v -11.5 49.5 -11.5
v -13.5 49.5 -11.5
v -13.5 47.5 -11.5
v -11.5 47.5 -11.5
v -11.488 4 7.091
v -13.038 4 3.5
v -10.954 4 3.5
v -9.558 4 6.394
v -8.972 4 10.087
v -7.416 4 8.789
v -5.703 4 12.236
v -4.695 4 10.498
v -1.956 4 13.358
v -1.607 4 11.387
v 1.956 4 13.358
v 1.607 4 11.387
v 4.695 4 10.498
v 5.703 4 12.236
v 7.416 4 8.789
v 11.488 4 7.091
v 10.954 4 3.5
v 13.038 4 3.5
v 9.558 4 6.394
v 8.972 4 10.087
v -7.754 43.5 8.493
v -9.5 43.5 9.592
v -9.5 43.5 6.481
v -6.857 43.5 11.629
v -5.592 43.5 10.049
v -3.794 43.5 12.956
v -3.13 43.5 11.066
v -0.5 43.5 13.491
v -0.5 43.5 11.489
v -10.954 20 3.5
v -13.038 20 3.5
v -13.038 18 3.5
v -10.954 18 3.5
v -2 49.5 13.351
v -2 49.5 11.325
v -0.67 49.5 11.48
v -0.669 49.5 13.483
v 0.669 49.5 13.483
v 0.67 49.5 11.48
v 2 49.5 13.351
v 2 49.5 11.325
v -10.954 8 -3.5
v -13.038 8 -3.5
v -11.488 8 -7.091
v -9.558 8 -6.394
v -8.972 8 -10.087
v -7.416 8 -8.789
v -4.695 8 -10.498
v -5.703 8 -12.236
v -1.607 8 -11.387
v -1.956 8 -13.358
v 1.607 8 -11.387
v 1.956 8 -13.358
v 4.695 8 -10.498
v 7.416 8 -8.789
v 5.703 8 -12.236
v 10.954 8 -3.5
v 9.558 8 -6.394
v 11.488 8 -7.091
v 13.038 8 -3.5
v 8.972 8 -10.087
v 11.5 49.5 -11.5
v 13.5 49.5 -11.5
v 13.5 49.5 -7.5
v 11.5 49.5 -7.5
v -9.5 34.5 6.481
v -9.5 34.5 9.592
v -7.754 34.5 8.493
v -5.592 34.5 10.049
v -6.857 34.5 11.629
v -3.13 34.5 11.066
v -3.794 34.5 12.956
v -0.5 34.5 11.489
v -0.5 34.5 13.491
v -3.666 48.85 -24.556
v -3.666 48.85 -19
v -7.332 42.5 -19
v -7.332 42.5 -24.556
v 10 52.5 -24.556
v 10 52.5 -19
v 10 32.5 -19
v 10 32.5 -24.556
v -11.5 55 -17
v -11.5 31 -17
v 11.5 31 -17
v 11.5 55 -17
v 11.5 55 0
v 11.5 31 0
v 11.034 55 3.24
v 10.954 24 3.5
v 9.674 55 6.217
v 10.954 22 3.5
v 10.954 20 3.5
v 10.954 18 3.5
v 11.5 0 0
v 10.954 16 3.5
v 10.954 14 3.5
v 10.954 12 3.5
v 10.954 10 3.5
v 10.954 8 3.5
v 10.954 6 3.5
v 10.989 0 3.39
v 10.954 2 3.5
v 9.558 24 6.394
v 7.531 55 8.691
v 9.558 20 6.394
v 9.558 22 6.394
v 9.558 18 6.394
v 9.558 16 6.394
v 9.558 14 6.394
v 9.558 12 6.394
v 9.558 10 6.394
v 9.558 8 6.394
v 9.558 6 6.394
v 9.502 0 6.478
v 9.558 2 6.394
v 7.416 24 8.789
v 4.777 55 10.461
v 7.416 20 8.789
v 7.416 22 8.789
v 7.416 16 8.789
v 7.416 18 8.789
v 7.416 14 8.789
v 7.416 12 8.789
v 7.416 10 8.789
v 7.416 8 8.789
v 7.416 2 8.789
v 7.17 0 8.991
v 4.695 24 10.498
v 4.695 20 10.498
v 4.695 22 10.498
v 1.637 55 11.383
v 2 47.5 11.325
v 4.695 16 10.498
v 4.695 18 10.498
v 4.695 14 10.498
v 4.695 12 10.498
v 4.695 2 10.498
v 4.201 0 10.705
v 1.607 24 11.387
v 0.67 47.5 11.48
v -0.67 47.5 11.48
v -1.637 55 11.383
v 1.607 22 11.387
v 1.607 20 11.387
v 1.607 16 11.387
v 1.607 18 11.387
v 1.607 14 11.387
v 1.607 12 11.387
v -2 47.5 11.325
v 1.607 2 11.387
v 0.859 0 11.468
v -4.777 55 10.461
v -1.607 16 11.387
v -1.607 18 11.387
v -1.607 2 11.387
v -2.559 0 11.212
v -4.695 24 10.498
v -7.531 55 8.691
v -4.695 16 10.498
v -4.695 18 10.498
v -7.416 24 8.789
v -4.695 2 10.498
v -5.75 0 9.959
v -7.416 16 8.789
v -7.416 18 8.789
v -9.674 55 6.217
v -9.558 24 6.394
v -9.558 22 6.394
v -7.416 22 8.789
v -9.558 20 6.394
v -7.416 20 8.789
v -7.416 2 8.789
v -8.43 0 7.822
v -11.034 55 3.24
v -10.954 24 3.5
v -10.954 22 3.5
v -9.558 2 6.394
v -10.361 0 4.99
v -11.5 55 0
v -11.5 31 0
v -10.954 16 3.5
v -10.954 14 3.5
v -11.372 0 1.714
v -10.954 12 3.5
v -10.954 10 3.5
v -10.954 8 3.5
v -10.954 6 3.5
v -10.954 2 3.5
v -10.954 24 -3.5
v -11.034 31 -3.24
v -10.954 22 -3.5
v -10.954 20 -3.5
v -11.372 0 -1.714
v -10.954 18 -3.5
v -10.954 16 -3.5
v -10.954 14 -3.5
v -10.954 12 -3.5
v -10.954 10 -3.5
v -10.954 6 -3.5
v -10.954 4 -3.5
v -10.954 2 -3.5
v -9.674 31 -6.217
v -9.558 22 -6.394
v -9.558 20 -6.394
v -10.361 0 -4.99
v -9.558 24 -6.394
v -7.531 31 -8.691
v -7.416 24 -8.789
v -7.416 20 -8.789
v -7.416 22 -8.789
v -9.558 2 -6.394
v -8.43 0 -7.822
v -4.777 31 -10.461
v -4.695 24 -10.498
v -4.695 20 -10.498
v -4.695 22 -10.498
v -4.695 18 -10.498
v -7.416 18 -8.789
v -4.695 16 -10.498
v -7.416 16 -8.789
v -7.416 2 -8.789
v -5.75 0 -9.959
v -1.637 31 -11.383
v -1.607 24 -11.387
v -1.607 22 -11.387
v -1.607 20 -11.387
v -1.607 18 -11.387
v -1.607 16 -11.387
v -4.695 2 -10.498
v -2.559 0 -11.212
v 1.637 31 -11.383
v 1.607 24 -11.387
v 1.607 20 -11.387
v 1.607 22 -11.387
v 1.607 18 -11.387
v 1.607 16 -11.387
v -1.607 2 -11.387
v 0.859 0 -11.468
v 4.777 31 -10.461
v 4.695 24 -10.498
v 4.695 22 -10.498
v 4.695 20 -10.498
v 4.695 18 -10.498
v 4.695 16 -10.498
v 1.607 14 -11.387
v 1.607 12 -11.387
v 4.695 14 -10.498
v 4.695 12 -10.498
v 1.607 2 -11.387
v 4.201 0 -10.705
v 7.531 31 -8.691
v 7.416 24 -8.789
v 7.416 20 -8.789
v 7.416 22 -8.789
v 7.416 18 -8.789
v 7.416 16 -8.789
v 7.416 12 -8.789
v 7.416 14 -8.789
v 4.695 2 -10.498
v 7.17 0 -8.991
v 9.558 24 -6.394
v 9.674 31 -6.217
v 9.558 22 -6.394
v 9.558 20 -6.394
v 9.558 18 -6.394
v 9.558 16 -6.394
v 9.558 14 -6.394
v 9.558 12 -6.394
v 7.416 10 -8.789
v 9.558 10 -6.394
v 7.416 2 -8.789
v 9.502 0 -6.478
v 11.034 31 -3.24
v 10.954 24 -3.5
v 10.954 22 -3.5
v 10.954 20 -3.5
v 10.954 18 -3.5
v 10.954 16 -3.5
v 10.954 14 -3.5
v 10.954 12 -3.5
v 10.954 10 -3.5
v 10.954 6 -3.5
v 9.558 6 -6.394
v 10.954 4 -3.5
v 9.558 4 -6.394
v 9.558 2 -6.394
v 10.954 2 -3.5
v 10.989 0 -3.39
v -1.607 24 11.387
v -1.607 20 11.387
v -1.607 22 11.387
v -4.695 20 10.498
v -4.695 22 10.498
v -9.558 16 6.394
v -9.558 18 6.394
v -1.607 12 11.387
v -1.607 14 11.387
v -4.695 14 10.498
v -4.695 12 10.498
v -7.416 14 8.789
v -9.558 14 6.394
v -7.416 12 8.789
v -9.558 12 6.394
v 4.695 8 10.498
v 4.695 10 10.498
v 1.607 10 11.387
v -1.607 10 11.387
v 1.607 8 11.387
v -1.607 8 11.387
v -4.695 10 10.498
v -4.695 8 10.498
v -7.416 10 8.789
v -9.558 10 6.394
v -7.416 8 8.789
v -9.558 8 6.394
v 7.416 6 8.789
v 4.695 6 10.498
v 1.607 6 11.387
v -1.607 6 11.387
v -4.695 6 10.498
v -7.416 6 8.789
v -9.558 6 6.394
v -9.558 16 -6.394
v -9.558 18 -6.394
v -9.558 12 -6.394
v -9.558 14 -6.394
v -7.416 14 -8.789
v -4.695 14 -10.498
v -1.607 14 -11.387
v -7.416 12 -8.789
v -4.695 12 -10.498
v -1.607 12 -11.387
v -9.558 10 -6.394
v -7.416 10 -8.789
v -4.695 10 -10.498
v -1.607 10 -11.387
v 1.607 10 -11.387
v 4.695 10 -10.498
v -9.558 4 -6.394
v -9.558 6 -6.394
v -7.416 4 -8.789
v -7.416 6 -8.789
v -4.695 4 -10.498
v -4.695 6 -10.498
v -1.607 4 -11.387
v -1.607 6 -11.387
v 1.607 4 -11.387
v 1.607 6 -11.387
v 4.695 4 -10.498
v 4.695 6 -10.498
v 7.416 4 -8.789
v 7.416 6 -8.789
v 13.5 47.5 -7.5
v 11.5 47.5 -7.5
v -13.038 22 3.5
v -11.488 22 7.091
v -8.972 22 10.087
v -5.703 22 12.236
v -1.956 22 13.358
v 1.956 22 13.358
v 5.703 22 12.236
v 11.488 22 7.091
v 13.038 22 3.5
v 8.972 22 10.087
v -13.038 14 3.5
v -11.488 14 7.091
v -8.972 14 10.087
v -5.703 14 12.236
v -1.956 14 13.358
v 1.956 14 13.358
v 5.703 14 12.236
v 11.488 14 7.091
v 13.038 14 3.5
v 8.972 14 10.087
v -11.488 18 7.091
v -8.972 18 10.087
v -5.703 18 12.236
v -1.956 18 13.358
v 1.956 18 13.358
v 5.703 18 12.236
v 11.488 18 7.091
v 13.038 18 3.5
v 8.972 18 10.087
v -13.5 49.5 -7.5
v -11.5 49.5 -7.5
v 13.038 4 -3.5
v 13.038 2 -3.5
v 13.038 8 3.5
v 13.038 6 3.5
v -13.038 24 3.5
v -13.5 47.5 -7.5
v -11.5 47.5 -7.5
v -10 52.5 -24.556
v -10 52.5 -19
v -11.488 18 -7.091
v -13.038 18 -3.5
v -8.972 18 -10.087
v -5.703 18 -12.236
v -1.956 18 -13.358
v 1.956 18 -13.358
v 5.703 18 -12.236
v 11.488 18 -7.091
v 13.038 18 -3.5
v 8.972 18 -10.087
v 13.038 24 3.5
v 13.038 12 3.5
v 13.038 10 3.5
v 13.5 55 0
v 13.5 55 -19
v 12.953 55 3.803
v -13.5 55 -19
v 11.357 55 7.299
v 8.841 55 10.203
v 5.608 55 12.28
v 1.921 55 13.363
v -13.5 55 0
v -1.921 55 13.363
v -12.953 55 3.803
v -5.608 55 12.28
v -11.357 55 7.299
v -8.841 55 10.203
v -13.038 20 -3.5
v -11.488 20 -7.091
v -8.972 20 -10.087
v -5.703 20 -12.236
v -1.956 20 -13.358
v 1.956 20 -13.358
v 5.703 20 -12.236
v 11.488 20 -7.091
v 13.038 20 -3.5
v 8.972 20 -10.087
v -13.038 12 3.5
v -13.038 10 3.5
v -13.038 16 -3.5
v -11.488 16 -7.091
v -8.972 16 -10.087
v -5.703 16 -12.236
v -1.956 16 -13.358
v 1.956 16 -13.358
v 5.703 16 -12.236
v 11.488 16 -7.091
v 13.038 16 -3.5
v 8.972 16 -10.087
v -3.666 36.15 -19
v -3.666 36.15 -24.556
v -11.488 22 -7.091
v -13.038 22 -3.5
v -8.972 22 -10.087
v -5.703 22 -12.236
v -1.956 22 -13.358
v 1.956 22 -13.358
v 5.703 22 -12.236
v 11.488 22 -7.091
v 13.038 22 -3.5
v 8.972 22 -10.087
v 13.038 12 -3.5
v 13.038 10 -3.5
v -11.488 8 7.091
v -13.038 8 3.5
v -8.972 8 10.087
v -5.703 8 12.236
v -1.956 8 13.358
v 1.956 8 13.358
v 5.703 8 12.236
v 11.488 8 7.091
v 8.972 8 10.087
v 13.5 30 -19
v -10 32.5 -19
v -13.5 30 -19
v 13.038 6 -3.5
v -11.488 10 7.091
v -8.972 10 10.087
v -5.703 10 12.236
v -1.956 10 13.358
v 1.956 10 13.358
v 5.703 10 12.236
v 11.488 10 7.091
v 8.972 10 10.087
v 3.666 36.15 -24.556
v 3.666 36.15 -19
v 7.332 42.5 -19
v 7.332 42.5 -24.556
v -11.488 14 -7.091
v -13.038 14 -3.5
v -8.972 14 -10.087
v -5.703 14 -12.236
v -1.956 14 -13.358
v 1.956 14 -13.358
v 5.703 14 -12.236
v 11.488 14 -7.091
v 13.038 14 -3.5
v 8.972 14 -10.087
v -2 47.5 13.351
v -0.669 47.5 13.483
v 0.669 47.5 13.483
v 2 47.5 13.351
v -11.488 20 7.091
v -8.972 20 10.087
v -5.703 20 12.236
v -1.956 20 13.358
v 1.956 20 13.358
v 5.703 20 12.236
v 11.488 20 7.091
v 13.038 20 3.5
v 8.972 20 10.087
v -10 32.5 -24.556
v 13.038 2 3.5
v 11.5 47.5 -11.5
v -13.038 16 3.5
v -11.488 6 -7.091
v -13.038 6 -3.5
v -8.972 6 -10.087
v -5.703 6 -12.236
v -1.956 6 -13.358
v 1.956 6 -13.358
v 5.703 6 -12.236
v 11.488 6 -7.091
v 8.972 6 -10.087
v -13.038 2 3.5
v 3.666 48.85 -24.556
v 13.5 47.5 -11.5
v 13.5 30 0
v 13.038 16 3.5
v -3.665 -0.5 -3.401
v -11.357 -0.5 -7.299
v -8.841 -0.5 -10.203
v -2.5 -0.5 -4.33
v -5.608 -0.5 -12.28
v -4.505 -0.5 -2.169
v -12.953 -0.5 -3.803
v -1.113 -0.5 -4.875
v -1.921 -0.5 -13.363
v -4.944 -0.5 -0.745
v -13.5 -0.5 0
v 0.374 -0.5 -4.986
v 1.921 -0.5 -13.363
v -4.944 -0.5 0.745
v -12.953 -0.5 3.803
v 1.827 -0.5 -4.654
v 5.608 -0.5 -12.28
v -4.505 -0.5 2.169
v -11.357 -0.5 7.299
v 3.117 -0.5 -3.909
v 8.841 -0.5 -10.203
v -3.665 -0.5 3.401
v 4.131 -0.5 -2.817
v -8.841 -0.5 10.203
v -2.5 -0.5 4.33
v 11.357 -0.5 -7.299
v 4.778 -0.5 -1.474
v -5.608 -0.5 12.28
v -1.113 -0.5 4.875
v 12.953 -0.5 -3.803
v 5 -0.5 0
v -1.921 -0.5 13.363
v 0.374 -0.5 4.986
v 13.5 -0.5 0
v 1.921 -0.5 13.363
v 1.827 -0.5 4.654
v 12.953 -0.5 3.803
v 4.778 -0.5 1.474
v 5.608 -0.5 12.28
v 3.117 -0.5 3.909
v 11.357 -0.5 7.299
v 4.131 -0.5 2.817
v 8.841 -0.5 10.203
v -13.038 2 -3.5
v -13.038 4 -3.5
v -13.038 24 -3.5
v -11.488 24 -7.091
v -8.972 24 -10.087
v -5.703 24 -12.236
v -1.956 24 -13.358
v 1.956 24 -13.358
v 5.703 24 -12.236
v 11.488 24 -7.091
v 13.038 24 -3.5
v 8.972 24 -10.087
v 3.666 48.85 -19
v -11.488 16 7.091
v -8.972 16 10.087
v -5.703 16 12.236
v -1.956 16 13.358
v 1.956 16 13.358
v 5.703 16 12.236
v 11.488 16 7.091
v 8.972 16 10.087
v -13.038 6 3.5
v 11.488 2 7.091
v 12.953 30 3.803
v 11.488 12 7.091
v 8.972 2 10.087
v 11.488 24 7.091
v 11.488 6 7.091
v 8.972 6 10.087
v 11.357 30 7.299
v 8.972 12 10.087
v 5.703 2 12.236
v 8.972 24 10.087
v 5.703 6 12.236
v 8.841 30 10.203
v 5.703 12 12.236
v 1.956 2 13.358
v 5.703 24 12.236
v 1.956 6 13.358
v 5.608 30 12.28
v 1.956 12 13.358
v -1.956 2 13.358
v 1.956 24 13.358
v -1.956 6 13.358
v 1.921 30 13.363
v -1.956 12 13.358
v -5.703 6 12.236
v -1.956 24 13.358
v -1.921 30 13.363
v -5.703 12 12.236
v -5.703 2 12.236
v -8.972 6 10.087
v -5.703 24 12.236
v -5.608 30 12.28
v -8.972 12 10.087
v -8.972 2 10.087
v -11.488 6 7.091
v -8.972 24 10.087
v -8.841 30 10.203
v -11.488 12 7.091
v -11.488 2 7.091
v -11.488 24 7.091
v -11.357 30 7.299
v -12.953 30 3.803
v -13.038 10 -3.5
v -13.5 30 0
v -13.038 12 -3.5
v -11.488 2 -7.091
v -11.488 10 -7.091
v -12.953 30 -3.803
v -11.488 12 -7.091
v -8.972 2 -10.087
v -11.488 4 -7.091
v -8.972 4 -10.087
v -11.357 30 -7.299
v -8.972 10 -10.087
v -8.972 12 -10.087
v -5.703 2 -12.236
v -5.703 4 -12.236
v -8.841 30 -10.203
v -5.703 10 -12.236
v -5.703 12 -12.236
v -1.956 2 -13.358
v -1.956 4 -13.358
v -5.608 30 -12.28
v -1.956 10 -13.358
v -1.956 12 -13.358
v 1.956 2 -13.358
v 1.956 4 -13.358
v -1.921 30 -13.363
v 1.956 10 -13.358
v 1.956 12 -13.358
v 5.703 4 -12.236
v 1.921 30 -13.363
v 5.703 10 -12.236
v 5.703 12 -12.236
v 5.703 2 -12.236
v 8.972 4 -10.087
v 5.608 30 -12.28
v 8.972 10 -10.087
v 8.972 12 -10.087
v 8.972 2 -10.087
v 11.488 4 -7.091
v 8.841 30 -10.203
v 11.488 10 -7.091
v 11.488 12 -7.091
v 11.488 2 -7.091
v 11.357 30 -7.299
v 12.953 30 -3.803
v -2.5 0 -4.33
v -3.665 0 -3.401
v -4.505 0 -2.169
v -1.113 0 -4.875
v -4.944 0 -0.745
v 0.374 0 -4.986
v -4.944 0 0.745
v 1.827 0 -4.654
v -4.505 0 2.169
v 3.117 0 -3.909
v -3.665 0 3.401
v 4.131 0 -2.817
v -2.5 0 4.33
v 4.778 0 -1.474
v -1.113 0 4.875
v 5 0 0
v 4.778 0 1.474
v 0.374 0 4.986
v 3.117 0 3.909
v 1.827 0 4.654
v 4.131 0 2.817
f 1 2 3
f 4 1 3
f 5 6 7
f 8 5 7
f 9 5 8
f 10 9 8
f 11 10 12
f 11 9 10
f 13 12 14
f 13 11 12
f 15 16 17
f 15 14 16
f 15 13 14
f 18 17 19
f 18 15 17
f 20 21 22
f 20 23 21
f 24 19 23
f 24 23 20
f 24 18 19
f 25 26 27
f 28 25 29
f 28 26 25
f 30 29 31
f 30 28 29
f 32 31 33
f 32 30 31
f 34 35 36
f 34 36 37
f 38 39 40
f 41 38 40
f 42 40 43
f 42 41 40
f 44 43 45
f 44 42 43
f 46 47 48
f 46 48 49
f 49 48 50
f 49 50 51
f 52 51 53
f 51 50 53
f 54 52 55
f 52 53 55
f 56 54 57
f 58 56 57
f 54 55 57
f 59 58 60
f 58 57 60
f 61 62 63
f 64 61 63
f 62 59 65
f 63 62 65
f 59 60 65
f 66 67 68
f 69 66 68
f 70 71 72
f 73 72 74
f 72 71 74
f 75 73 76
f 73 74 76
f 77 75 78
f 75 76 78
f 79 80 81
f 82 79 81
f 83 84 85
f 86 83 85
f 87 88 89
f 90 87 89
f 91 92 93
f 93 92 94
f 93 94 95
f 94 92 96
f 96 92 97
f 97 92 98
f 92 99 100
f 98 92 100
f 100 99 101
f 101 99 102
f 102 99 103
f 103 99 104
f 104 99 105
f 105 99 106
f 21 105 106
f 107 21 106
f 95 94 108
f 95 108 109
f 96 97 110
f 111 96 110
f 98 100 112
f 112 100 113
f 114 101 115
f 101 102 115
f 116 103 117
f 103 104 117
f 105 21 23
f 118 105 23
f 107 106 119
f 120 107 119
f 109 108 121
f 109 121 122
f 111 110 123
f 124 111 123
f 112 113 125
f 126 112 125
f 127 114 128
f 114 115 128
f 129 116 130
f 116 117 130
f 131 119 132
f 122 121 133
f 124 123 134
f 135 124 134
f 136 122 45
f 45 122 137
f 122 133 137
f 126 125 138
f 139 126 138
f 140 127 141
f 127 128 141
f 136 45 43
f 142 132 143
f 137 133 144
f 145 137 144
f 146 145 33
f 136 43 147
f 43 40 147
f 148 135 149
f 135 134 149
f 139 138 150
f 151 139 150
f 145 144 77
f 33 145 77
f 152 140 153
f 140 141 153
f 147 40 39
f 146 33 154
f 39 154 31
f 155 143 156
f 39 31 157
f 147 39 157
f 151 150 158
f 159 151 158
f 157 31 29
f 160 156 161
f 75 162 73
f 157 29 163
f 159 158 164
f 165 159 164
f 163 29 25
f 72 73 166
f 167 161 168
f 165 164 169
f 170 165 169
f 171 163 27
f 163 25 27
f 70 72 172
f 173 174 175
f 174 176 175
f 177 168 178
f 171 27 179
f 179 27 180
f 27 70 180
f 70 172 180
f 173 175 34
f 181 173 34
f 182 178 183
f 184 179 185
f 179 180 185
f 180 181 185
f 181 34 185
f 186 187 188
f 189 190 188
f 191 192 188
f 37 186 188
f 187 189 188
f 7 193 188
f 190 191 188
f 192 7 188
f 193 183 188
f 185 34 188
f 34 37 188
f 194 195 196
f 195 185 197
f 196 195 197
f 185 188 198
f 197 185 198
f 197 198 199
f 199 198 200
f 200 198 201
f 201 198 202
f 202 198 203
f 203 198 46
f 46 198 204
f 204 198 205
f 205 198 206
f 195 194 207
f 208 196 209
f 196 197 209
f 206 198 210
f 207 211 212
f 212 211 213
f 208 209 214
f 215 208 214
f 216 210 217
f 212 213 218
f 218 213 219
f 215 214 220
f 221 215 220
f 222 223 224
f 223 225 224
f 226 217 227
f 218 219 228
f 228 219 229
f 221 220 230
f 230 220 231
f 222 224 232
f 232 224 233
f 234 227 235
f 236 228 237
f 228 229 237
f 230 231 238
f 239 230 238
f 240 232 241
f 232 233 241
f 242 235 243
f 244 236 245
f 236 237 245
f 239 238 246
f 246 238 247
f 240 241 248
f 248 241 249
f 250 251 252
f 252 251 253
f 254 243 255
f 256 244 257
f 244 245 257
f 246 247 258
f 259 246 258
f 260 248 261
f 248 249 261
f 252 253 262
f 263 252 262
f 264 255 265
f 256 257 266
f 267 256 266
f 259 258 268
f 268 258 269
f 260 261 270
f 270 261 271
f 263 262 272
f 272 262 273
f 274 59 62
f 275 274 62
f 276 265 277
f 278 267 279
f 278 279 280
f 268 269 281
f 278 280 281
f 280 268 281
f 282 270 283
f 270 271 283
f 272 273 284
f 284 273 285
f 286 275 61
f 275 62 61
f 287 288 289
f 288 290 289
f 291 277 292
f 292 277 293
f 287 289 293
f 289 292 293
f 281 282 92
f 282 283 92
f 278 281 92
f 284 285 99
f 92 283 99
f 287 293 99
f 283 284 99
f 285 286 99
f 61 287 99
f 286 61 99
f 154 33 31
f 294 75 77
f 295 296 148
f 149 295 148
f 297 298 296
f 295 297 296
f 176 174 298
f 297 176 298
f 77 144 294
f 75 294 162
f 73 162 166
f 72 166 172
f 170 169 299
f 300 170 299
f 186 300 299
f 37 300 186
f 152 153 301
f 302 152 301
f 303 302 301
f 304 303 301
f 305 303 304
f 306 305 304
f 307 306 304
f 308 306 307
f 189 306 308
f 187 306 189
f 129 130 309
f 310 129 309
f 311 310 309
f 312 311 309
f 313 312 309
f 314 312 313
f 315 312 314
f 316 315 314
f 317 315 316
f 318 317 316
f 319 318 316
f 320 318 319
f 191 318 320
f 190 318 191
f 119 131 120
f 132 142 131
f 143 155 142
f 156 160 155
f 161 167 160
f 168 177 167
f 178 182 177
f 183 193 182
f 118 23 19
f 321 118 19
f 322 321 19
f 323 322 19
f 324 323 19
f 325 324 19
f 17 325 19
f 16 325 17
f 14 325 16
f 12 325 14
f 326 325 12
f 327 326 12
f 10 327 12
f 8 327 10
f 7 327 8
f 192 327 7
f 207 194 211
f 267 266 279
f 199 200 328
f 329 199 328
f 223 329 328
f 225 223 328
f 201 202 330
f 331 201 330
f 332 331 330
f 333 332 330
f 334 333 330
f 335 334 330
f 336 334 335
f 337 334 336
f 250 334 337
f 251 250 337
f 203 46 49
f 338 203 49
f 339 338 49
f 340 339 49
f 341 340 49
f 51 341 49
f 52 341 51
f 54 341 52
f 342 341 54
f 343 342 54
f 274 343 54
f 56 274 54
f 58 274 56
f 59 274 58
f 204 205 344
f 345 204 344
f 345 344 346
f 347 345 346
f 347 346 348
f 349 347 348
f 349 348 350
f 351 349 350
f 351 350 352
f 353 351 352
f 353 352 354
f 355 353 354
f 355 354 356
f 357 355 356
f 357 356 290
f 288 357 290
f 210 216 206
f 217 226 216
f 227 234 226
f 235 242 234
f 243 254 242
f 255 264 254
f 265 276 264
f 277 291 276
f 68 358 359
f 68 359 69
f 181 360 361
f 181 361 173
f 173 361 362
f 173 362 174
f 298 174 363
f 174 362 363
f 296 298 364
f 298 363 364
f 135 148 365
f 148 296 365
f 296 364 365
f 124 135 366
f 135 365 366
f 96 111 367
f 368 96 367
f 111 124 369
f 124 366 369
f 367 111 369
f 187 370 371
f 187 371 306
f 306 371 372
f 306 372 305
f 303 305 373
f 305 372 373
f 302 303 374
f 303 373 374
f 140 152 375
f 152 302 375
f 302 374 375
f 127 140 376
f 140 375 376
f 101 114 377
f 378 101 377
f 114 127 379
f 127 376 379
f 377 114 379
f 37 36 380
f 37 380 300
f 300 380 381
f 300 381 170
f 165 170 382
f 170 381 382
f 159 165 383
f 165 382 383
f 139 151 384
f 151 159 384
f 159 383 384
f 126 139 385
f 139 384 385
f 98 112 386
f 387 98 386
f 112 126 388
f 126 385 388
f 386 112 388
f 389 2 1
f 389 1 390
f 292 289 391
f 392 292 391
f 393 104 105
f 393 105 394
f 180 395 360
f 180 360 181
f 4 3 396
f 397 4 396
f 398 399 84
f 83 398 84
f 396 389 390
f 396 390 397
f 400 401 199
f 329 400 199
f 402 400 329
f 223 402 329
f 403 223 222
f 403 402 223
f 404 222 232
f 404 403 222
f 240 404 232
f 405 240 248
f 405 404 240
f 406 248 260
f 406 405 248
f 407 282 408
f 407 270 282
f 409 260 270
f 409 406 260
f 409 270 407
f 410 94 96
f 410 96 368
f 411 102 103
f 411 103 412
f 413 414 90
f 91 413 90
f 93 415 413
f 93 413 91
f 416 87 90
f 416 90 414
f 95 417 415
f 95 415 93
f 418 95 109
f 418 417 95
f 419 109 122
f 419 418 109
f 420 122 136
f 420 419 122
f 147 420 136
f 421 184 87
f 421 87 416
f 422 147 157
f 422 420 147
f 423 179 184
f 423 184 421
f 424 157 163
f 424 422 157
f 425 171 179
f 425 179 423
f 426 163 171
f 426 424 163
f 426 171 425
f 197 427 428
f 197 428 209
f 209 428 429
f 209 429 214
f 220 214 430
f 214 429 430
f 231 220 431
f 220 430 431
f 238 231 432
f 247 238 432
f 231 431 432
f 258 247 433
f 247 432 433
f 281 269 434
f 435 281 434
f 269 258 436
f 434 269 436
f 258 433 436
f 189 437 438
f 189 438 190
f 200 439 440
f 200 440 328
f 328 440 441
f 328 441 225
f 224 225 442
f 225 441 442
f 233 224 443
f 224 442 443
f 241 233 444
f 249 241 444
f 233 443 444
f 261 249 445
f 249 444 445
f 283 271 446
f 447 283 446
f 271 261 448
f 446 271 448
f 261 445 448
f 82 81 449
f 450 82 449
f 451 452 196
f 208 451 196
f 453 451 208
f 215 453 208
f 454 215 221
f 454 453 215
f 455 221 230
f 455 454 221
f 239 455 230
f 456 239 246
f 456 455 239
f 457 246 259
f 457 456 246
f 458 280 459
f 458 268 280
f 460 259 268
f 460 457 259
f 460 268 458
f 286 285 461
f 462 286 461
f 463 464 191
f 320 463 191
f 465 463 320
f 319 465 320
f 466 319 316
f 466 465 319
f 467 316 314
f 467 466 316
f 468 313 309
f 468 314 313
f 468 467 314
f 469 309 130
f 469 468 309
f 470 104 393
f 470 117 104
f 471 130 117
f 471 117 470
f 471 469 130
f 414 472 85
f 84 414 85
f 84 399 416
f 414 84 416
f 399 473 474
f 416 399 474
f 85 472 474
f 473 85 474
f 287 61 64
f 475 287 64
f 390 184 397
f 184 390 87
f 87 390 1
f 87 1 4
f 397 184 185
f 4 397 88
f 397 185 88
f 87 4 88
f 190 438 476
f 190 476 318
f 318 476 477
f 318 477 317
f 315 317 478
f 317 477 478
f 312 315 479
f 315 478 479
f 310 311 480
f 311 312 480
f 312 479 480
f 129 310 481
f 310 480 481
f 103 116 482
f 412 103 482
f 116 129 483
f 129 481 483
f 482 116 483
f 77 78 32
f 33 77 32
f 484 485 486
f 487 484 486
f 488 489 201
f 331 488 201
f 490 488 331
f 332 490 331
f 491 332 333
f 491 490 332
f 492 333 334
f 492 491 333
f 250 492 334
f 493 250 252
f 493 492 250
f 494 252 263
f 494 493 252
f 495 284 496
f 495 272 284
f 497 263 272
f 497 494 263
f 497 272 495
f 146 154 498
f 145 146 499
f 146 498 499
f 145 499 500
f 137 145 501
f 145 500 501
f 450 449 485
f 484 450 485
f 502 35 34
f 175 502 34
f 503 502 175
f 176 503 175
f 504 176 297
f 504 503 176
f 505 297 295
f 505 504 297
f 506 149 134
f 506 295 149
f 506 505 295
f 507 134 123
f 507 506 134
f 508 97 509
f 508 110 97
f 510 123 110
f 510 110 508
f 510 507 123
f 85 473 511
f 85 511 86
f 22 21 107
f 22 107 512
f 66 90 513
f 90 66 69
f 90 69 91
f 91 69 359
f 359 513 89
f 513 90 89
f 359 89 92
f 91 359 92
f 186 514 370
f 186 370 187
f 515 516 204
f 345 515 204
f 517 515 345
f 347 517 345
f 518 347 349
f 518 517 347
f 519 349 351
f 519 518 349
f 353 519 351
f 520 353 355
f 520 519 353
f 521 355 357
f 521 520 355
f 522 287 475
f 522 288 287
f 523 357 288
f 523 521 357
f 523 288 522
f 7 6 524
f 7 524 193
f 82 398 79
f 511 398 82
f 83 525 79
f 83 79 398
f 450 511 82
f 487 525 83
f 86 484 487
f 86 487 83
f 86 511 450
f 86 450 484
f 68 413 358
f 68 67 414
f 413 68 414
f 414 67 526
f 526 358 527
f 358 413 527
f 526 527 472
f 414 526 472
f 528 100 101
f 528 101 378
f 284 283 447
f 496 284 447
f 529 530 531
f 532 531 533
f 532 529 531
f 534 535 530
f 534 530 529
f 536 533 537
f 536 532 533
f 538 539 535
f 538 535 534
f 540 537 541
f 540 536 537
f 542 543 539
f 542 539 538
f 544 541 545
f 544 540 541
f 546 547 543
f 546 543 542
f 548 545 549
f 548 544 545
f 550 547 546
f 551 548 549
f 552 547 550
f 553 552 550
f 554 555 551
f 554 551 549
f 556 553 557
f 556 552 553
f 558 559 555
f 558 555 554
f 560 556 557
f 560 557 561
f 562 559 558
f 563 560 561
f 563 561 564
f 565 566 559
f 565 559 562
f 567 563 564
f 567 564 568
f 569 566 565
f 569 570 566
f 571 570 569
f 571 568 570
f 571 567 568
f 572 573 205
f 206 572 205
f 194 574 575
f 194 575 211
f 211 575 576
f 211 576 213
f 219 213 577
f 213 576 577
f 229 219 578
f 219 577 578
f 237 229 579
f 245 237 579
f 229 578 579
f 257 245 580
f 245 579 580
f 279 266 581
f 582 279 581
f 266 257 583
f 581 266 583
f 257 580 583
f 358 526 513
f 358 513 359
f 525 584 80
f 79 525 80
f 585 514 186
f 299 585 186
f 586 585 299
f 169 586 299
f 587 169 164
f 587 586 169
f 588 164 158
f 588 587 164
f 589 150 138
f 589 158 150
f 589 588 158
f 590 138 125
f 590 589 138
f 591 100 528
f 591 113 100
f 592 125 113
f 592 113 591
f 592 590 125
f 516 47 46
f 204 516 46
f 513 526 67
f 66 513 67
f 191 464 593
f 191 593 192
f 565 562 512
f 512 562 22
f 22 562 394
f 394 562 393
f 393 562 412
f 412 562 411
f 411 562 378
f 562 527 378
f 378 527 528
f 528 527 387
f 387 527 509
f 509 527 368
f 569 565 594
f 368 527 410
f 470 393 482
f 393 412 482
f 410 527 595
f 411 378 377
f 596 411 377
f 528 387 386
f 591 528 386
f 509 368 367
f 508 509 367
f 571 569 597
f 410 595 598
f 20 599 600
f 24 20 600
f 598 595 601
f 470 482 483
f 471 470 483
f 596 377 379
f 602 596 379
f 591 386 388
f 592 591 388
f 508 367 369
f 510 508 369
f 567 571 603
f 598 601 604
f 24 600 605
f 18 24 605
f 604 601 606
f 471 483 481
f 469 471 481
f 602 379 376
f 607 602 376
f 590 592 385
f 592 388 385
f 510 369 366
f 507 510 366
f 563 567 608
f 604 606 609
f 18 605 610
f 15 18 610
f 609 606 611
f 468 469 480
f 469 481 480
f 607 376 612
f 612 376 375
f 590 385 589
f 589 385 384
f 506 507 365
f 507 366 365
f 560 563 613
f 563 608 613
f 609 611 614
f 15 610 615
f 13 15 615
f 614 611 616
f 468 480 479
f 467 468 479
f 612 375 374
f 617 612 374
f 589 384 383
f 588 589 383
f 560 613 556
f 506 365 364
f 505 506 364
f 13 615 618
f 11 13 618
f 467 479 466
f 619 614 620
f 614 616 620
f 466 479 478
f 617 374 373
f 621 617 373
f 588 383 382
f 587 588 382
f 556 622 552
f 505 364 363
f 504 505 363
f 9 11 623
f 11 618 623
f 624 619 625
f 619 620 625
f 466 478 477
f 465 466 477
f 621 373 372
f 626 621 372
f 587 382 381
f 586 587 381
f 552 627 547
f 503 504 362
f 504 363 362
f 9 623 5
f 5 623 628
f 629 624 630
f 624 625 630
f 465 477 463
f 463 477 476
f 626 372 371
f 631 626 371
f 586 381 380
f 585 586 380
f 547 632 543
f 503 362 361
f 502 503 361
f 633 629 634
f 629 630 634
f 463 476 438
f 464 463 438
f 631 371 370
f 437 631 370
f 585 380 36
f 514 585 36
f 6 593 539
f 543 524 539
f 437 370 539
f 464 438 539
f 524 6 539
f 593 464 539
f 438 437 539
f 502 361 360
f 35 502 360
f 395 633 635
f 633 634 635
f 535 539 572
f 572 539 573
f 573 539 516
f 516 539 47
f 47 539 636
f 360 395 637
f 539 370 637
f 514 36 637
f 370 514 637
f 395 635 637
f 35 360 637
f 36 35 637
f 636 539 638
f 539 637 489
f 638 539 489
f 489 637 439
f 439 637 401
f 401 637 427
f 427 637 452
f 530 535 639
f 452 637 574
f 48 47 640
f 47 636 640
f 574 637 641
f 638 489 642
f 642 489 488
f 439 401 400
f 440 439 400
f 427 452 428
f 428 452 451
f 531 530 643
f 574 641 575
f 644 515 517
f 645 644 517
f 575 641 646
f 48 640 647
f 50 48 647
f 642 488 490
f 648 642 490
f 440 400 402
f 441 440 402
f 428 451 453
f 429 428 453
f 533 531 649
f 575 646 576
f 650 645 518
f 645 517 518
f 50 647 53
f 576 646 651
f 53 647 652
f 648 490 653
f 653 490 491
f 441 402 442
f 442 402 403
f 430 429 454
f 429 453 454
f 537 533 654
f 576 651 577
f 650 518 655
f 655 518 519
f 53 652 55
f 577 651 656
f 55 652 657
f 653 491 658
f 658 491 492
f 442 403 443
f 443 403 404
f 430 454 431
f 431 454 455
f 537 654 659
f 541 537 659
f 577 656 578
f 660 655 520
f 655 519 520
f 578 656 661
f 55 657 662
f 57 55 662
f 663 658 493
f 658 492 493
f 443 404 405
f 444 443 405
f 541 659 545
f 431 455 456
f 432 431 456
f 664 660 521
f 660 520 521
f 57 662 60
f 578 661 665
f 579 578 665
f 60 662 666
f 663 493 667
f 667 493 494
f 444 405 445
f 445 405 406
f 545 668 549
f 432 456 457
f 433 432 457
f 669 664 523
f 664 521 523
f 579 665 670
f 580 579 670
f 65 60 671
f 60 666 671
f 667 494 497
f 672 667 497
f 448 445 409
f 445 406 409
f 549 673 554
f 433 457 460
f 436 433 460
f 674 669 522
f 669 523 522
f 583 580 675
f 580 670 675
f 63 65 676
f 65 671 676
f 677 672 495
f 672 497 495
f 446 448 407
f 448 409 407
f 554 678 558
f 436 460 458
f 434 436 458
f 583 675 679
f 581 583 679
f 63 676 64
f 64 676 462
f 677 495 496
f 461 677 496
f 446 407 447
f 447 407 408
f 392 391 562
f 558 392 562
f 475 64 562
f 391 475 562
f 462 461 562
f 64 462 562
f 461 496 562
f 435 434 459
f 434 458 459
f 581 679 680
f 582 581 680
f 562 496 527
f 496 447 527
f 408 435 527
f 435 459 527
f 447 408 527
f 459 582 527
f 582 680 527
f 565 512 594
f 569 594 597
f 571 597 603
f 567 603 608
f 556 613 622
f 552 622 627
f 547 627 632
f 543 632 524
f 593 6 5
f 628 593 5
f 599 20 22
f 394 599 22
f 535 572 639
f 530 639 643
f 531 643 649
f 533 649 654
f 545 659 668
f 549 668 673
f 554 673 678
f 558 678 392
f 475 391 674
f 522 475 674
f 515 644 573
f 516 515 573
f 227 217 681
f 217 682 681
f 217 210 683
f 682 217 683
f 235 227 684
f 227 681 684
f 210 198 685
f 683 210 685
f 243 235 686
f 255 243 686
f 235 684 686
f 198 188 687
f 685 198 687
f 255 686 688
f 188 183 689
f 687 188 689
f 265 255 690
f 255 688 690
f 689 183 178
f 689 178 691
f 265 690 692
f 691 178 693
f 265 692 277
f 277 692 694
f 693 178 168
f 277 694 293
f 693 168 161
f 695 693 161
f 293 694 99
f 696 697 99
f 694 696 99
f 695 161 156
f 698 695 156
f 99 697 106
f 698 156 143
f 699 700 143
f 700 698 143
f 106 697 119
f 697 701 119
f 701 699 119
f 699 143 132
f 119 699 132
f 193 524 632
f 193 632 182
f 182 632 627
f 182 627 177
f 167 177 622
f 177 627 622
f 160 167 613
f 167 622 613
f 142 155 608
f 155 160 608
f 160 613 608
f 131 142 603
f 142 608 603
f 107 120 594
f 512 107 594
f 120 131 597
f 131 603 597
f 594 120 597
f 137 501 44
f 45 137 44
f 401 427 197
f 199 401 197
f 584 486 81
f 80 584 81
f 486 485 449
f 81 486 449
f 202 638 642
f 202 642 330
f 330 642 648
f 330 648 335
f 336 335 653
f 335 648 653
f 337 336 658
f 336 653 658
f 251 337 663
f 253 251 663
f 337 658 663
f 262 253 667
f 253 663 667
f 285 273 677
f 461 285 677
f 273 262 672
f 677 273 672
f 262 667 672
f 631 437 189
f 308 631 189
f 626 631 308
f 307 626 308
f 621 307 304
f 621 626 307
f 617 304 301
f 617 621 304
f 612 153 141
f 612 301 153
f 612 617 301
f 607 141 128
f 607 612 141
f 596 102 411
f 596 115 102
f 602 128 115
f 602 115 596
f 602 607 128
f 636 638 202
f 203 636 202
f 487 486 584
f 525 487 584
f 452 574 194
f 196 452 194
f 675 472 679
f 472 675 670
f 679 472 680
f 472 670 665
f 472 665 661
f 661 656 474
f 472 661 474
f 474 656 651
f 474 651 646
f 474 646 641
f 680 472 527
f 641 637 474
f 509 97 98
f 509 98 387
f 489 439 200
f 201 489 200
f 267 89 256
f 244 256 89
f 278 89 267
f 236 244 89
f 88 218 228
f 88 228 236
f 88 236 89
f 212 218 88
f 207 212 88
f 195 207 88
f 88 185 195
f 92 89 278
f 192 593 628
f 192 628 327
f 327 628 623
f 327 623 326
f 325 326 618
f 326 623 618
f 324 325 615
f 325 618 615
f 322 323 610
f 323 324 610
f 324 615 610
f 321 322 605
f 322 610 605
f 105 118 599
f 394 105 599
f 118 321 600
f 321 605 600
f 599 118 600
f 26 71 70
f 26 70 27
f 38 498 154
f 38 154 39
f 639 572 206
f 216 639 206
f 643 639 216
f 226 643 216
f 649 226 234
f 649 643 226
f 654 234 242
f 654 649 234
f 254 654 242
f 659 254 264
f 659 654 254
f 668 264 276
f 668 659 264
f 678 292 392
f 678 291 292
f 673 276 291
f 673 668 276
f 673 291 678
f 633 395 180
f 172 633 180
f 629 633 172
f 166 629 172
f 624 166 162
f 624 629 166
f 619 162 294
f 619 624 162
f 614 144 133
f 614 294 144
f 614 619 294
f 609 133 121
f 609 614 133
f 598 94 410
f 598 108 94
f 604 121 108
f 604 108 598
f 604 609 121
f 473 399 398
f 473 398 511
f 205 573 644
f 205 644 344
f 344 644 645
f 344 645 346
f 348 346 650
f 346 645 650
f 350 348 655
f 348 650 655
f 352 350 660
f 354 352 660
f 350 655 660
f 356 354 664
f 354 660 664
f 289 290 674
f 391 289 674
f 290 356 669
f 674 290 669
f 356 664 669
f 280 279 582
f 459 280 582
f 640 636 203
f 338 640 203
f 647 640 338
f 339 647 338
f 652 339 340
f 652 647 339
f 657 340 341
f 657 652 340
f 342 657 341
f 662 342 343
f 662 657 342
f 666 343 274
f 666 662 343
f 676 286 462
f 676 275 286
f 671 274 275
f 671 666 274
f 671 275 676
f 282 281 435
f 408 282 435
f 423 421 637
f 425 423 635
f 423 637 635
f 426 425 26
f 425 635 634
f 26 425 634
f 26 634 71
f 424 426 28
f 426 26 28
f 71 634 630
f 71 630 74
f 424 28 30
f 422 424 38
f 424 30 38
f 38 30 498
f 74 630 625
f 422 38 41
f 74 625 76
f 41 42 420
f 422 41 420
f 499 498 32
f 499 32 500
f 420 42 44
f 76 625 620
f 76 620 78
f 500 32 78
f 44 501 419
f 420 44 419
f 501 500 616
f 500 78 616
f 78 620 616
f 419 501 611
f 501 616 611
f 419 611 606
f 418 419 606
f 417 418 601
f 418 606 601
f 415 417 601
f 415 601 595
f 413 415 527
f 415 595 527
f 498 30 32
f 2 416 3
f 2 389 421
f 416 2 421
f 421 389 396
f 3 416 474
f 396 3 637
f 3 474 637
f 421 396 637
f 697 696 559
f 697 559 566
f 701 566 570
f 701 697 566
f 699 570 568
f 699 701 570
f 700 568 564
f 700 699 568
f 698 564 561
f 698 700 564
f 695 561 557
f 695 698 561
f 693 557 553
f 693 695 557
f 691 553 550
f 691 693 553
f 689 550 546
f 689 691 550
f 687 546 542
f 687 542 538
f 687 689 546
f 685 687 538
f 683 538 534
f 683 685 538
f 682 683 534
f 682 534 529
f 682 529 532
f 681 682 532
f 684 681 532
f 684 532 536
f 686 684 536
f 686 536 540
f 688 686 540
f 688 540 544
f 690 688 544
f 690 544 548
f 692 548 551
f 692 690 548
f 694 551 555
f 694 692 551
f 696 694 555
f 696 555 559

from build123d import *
from build123d import SkipClean  # not in build123d's __all__

# Parameters (mm, degrees)
F0_R      = 13.5
F0_R_2    = 11.5
F1_DEPTH  = 30
F2_R      = 13.5
F2_R_2    = 5
F3_DEPTH  = 0.5
F5_W      = 27
F5_H      = 2
F6_DEPTH  = 10
F8_W      = 27
F8_H      = 2
F9_DEPTH  = 10
F11_DEPTH = 25
F13_DEPTH = 1
F14_W     = 20
F14_H     = 20
F15_DEPTH = 5.55625
F16_W     = 4
F16_H     = 2
F17_DEPTH = 3
F18_W     = 2
F18_H     = 4
F19_DEPTH = 2
F20_W     = 2
F20_H     = 4
F21_DEPTH = 2
F22_W     = 9
F22_H     = 9
F23_DEPTH = 8


# Not quite as in the source:
# - after a boolean that leaves OpenCascade's solid faulty, fix() repairs it
# - a length typed as a fraction of an inch, garbled in the dataset ("3 / 203.2 mm" for 3/8 in), is restored


with BuildPart() as f1:
    # F0 (on Front) → F1 (new body)
    with BuildSketch(Plane.XZ):
        Circle(F0_R)
        Circle(F0_R_2, mode=Mode.SUBTRACT)
    extrude(amount=-F1_DEPTH)

    # F2 (on Front) → F3 (join)
    with BuildSketch(Plane.XZ):
        Circle(F2_R)
        Circle(F2_R_2, mode=Mode.SUBTRACT)
    extrude(amount=F3_DEPTH)

    # F5 (on offset) → F6 (cut)
    with BuildSketch(Plane.XY.offset(13.5)):
        with Locations((0, 2.9999998671)):
            Rectangle(F5_W, F5_H)
        with Locations((0, 22.9999998671)):
            Rectangle(F5_W, F5_H)
        with Locations((0, 6.9999998671)):
            Rectangle(F5_W, F5_H)
        with Locations((0, 10.9999998671)):
            Rectangle(F5_W, F5_H)
        with Locations((0, 14.9999998671)):
            Rectangle(F5_W, F5_H)
        with Locations((0, 18.9999998671)):
            Rectangle(F5_W, F5_H)
    extrude(amount=-F6_DEPTH, mode=Mode.SUBTRACT)

    # F8 (on offset) → F9 (cut)
    with BuildSketch(Plane.XY.offset(-13.5)):
        with Locations((5.811e-07, 3.000000095)):
            Rectangle(F8_W, F8_H)
        with Locations((5.811e-07, 7.000000095)):
            Rectangle(F8_W, F8_H)
        with Locations((5.811e-07, 11.000000095)):
            Rectangle(F8_W, F8_H)
        with Locations((5.811e-07, 15.000000095)):
            Rectangle(F8_W, F8_H)
        with Locations((5.811e-07, 19.000000095)):
            Rectangle(F8_W, F8_H)
        with Locations((5.811e-07, 23.000000095)):
            Rectangle(F8_W, F8_H)
    extrude(amount=F9_DEPTH, mode=Mode.SUBTRACT)

    # F10 (on face) → F11 (join)
    with BuildSketch(Plane(origin=(0, 30, 0), x_dir=(-1, 0, 0), z_dir=(0, 1, 0))):
        with BuildLine():
            Line((11.5, 0), (11.5, -7.0710678119))
            ThreePointArc((11.5, -7.0710678119), (12.9903810568, -3.6742346142), (13.5, 0))
            ThreePointArc((13.5, 0), (0, 13.5), (-13.5, 0))
            ThreePointArc((-13.5, 0), (-12.9903810568, -3.6742346142), (-11.5, -7.0710678119))
            Line((-11.5, -7.0710678119), (-11.5, 0))
            ThreePointArc((-11.5, 0), (0, 11.5), (11.5, 0))
        make_face()
        with BuildLine():
            ThreePointArc((13.5, 0), (12.9903810568, -3.6742346142), (11.5, -7.0710678119))
            Line((11.5, -7.0710678119), (11.5, -17))
            Line((11.5, -17), (-11.5, -17))
            Line((-11.5, -17), (-11.5, -7.0710678119))
            ThreePointArc((-11.5, -7.0710678119), (-12.9903810568, -3.6742346142), (-13.5, 0))
            Line((-13.5, 0), (-13.5, -19))
            Line((-13.5, -19), (13.5, -19))
            Line((13.5, -19), (13.5, 0))
        make_face()
    with SkipClean():  # cleaning this boolean's faces spoils the solid; the shape is the same uncleaned
        extrude(amount=F11_DEPTH)

    # F12 (on face) → F13 (join)
    with BuildSketch(Plane(origin=(0, 30, 0), x_dir=(-1, 0, 0), z_dir=(0, 1, 0))):
        with BuildLine():
            Line((13.5, -19), (13.5, 0))
            ThreePointArc((13.5, 0), (12.9903810568, -3.6742346142), (11.5, -7.0710678119))
            ThreePointArc((11.5, -7.0710678119), (0, -13.5), (-11.5, -7.0710678119))
            ThreePointArc((-11.5, -7.0710678119), (-12.9903810568, -3.6742346142), (-13.5, 0))
            Line((-13.5, 0), (-13.5, -19))
            Line((-13.5, -19), (13.5, -19))
        make_face()
        with BuildLine():
            ThreePointArc((-11.5, -7.0710678119), (0, -13.5), (11.5, -7.0710678119))
            Line((11.5, -7.0710678119), (11.5, 0))
            ThreePointArc((11.5, 0), (0, -11.5), (-11.5, 0))
            Line((-11.5, 0), (-11.5, -7.0710678119))
        make_face()
    with SkipClean():  # cleaning this boolean's faces spoils the solid; the shape is the same uncleaned
        extrude(amount=F13_DEPTH)

    # F14 (on face) → F15 (join)
    with BuildSketch(Plane(origin=(0, 0, -19), x_dir=(1, 0, 0), z_dir=(0, 0, -1))):
        with Locations((0, -42.5)):
            Rectangle(F14_W, F14_H)
        Polygon((-3.6661742094, -36.15), (3.6661742094, -36.15), (7.3323484187, -42.5), (3.6661742094, -48.85), (-3.6661742094, -48.85), (-7.3323484187, -42.5), align=None, mode=Mode.SUBTRACT)
    extrude(amount=F15_DEPTH)

    add(f1.part.fix(), mode=Mode.REPLACE)

    # F16 (on offset) → F17 (cut)
    with BuildSketch(Plane.XY.offset(13.5)):
        with Locations((0, 48.5)):
            Rectangle(F16_W, F16_H)
    extrude(amount=-F17_DEPTH, mode=Mode.SUBTRACT)

    # F18 (on face) → F19 (cut)
    with BuildSketch(Plane.YZ.offset(13.5)):
        with Locations((48.5, -9.5)):
            Rectangle(F18_W, F18_H)
    extrude(amount=-F19_DEPTH, mode=Mode.SUBTRACT)

    # F20 (on face) → F21 (cut)
    with BuildSketch(Plane(origin=(-13.5, 0, 0), x_dir=(0, -1, 0), z_dir=(-1, 0, 0))):
        with Locations((-48.5, -9.5)):
            Rectangle(F20_W, F20_H)
    extrude(amount=-F21_DEPTH, mode=Mode.SUBTRACT)

    # F22 (on offset) → F23 (cut)
    with BuildSketch(Plane.XY.offset(13.5)):
        with Locations((-5, 39)):
            Rectangle(F22_W, F22_H)
    extrude(amount=-F23_DEPTH, mode=Mode.SUBTRACT)


solid = f1.part
